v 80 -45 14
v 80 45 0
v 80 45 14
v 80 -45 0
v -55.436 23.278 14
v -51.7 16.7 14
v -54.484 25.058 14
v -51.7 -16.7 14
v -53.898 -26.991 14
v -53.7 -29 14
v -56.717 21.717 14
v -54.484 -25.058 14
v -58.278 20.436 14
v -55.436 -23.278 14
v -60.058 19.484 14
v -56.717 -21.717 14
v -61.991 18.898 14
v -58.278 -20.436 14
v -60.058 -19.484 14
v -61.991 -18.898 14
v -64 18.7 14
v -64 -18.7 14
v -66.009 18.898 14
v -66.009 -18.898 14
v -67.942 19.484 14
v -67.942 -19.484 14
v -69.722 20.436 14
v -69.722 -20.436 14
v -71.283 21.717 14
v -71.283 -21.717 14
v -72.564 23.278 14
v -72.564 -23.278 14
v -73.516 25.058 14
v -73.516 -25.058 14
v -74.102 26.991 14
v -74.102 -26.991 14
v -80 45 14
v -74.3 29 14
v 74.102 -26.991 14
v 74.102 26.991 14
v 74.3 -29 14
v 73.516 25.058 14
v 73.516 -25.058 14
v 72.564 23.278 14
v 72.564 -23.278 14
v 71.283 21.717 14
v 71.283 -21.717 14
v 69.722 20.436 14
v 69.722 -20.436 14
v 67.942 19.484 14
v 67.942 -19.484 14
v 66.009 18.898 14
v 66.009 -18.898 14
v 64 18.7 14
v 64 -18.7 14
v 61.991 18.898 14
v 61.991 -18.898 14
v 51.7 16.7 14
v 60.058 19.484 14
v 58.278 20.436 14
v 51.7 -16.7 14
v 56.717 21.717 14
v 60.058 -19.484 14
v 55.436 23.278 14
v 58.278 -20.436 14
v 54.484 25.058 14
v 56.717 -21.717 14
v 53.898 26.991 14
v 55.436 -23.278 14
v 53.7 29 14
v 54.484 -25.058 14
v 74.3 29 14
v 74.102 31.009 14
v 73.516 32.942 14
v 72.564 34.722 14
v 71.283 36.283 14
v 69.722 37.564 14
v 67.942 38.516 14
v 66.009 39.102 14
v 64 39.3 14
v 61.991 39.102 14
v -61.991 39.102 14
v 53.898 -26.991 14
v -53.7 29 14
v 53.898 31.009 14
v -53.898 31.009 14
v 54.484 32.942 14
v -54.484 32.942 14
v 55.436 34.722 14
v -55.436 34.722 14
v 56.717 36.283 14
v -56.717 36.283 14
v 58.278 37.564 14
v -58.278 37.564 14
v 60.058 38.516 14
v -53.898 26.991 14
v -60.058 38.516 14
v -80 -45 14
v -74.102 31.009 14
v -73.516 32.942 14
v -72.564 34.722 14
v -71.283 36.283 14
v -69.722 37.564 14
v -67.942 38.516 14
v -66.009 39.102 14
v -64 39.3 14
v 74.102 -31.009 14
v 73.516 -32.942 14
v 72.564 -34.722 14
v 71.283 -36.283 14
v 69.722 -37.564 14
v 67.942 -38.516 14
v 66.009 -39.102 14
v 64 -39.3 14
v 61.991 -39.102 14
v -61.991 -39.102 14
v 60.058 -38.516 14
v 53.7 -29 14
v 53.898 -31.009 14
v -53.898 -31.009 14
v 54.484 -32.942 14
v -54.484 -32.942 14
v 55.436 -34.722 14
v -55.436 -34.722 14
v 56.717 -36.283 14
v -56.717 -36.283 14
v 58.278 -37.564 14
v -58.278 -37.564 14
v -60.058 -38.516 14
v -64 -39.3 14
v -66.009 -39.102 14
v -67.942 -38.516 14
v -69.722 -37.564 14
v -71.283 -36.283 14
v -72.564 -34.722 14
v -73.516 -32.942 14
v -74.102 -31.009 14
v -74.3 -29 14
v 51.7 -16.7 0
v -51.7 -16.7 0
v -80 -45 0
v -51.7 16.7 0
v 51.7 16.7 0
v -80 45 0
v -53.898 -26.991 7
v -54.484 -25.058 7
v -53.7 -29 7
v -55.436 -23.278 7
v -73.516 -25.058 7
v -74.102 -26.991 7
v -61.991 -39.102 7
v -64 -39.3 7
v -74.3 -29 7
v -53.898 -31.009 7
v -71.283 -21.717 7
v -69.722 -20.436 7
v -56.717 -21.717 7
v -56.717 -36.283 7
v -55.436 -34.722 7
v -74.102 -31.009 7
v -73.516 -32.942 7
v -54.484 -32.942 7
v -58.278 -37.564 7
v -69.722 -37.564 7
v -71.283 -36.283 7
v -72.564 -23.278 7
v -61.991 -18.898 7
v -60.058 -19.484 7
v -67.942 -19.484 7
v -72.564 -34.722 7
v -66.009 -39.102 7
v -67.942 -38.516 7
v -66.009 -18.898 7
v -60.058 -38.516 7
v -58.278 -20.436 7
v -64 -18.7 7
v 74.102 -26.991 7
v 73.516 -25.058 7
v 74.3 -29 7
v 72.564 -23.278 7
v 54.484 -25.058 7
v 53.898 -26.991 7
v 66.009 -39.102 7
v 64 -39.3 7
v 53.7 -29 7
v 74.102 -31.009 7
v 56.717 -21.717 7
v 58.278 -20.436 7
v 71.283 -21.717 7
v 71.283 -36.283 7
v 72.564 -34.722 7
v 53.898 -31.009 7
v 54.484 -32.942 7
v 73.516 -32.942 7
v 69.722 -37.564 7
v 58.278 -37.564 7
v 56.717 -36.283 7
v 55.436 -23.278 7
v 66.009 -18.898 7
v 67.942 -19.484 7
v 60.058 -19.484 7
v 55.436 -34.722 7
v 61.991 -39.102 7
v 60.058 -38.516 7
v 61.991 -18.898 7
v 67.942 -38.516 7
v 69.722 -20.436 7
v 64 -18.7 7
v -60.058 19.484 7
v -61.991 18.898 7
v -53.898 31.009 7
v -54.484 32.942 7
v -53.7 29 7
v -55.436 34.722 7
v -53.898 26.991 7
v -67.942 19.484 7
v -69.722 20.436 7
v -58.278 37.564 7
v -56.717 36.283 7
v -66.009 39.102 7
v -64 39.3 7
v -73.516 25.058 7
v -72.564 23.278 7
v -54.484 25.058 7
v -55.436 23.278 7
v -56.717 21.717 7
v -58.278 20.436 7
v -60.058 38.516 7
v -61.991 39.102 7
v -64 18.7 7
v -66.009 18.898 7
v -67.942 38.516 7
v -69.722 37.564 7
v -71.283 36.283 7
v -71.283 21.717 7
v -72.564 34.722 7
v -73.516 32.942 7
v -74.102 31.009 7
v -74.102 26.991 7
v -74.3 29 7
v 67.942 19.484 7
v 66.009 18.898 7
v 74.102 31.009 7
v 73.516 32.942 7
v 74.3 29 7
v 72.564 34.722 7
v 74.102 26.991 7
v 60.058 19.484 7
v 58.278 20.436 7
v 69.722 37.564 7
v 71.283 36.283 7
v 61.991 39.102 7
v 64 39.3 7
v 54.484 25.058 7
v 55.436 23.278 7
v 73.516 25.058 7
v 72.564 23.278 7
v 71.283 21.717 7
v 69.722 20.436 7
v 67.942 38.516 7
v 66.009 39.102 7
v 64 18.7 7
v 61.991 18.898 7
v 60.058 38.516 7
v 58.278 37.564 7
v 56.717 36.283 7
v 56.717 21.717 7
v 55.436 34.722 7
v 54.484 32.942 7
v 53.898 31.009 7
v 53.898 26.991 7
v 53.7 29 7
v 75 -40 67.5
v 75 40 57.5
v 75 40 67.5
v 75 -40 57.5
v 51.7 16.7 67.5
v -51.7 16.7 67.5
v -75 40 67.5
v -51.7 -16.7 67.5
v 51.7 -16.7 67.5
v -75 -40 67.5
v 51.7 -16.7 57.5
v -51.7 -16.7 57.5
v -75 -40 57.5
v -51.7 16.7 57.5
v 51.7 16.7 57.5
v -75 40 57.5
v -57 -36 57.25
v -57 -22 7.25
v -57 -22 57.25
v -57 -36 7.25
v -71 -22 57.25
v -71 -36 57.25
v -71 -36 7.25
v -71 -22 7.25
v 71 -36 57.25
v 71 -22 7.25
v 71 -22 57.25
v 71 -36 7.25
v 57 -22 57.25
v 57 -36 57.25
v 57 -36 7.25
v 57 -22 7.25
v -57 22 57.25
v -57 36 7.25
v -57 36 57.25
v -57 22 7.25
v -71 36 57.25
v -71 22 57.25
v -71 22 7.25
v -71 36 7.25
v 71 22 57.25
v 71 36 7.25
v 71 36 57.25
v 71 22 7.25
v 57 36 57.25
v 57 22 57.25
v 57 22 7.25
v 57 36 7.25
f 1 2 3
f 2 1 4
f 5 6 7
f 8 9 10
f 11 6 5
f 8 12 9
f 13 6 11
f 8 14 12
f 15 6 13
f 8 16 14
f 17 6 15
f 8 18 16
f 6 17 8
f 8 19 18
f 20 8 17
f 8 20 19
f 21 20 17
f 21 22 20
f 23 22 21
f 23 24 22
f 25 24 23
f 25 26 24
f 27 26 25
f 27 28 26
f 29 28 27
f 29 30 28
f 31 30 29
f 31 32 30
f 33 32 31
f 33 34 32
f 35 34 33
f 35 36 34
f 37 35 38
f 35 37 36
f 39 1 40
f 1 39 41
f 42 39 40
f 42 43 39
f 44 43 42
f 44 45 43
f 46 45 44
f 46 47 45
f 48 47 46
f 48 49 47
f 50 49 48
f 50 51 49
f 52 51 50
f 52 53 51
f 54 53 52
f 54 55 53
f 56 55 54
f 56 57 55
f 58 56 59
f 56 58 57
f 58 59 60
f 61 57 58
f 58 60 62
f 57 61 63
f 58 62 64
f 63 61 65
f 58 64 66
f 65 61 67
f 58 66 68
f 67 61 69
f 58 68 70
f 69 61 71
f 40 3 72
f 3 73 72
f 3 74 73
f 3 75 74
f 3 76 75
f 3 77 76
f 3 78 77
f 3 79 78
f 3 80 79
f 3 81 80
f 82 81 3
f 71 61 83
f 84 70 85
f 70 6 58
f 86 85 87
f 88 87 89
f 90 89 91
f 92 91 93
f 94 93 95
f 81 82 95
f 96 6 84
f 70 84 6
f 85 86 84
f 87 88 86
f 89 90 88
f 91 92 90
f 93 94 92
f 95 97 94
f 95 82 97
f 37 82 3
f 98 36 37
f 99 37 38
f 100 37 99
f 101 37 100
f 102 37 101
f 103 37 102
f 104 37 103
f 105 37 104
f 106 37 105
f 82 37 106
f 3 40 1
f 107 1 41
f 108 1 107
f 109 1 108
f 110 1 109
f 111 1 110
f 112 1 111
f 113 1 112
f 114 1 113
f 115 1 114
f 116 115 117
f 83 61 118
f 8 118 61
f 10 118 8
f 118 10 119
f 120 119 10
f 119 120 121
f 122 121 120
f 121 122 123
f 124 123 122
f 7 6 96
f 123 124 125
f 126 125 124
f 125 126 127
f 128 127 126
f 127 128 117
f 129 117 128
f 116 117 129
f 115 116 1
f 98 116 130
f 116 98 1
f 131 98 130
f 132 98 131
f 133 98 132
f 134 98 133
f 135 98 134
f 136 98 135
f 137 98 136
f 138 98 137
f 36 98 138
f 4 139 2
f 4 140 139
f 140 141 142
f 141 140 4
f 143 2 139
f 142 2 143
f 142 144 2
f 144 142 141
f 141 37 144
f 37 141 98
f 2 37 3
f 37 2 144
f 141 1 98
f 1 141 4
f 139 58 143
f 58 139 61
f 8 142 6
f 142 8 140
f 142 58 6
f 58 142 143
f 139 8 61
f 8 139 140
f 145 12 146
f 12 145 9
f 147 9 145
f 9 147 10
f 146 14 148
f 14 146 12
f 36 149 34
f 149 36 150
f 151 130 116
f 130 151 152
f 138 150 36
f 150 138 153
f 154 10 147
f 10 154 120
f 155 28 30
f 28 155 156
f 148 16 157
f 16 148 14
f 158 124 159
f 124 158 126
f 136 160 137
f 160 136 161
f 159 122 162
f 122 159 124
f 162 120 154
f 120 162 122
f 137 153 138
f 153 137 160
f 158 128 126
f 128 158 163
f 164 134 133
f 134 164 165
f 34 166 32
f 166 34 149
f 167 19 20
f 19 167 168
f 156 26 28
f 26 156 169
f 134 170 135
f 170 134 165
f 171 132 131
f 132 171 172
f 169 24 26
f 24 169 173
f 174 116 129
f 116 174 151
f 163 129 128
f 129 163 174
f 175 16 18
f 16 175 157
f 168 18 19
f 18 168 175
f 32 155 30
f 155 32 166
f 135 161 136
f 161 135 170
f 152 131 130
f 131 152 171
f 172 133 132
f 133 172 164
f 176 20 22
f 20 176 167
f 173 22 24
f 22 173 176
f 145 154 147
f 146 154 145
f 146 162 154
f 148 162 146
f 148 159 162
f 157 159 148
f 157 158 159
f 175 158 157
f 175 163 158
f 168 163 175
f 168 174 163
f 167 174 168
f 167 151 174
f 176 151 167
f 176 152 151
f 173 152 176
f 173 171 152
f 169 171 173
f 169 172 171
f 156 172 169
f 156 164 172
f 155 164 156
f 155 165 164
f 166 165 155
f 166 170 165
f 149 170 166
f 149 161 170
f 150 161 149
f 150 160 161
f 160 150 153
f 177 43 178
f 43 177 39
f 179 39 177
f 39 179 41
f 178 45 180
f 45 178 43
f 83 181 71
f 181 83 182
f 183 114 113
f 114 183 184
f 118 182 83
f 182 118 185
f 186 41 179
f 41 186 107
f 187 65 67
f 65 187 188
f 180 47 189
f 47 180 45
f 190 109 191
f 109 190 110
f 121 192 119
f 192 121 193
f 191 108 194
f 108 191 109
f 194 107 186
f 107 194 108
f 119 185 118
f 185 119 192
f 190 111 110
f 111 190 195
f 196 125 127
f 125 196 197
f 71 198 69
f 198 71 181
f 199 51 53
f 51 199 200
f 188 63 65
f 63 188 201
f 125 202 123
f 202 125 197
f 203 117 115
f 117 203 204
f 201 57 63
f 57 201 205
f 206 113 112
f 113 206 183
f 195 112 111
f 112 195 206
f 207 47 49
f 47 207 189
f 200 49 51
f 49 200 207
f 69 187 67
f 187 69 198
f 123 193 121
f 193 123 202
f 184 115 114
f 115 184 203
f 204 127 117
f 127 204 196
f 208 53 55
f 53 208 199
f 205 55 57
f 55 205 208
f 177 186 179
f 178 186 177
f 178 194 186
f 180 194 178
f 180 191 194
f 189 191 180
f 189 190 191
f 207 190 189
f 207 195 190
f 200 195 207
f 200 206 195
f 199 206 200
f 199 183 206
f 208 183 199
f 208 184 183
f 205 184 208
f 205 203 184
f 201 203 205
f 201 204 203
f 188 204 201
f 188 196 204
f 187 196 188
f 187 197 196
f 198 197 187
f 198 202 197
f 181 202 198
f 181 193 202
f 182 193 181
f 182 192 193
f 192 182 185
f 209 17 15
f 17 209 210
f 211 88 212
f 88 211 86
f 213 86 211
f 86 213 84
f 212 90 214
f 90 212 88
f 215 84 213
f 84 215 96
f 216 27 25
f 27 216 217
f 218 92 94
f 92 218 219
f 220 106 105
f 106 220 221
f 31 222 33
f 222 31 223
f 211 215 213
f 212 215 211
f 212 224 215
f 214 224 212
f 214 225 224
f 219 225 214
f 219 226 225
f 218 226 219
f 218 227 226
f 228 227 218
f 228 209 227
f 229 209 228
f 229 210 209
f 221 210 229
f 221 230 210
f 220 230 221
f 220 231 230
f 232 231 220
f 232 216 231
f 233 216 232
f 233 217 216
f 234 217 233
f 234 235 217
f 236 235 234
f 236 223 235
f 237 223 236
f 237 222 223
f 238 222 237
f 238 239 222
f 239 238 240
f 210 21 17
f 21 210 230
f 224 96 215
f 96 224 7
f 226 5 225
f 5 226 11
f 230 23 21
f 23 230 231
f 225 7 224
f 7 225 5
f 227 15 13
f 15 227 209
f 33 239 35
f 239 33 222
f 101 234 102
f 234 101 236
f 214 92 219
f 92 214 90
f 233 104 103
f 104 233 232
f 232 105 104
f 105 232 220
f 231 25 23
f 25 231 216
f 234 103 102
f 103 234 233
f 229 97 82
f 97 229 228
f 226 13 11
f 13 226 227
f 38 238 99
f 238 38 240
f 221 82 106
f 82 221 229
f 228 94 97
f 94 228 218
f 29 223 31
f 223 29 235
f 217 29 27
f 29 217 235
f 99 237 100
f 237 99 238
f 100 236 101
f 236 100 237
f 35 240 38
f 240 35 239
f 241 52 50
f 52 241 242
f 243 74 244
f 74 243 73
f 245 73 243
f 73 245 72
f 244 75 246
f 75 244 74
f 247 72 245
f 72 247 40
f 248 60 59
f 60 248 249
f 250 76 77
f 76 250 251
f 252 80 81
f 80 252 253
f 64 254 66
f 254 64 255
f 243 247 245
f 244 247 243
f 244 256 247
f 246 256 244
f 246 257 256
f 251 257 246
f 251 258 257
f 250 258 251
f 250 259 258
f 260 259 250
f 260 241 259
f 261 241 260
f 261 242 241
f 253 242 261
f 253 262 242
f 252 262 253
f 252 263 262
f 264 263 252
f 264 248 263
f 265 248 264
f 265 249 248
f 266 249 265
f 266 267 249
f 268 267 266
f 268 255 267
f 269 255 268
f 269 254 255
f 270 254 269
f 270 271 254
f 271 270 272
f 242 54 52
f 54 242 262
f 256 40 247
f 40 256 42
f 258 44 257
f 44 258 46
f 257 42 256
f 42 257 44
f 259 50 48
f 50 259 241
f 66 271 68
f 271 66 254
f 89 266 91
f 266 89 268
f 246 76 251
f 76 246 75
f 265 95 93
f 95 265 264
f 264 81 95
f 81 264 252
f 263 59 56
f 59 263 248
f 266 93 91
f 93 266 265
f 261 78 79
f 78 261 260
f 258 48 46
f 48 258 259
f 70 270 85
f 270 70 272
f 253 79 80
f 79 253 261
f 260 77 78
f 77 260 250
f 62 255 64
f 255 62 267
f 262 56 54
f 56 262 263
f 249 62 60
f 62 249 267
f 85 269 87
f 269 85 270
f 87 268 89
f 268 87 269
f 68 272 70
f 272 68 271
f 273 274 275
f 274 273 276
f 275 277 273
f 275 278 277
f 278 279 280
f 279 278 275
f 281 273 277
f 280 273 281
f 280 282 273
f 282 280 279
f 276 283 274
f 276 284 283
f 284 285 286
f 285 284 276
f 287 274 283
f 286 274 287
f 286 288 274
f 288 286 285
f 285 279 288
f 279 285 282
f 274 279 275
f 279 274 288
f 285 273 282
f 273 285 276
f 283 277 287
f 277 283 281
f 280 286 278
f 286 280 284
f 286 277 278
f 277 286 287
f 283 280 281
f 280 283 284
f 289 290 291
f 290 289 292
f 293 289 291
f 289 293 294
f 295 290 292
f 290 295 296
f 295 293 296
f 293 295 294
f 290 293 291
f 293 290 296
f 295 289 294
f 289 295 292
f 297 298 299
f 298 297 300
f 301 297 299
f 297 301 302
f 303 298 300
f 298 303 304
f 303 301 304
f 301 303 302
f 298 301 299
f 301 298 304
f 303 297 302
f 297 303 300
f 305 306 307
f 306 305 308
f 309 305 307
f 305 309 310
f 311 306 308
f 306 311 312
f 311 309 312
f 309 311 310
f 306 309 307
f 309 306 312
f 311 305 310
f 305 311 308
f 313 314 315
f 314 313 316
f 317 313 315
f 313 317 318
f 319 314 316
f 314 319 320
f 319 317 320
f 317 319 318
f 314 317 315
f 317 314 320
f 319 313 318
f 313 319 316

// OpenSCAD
$fn = 32;

// ------------------------------------------------------------------------
// Frame cube: base 160 x 90 mm, posts 50 mm tall
// Every part is its own module, assembly() places every instance.
// ------------------------------------------------------------------------

// --- part 1 ---
module base_frame() {
  difference() {
    translate([-80, -45, 0]) cube([160, 90, 14]);
    translate([-51.7, -16.7, -1]) cube([103.4, 33.4, 16]);
    translate([-64, -29, 7]) cylinder(h = 8, d = 20.6);
    translate([64, -29, 7]) cylinder(h = 8, d = 20.6);
    translate([-64, 29, 7]) cylinder(h = 8, d = 20.6);
    translate([64, 29, 7]) cylinder(h = 8, d = 20.6);
  }
}

// --- part 2 ---
module corner_post() {
  translate([-7, -7, 0]) cube([14, 14, 50]);
}

// --- part 3 ---
module top_frame() {
  difference() {
    translate([-75, -40, 0]) cube([150, 80, 10]);
    translate([-51.7, -16.7, -1]) cube([103.4, 33.4, 12]);
  }
}

// --- assembly ---
module assembly() {
  color([0.80, 0.24, 0.20]) translate([0, 0, 0]) rotate([0, 0, 0]) base_frame();
  color([0.20, 0.45, 0.75]) translate([-64, -29, 7.25]) rotate([0, 0, 0]) corner_post();
  color([0.25, 0.62, 0.32]) translate([64, -29, 7.25]) rotate([0, 0, 0]) corner_post();
  color([0.92, 0.70, 0.18]) translate([-64, 29, 7.25]) rotate([0, 0, 0]) corner_post();
  color([0.58, 0.35, 0.70]) translate([64, 29, 7.25]) rotate([0, 0, 0]) corner_post();
  color([0.16, 0.66, 0.66]) translate([0, 0, 57.5]) rotate([0, 0, 0]) top_frame();
}

assembly();
